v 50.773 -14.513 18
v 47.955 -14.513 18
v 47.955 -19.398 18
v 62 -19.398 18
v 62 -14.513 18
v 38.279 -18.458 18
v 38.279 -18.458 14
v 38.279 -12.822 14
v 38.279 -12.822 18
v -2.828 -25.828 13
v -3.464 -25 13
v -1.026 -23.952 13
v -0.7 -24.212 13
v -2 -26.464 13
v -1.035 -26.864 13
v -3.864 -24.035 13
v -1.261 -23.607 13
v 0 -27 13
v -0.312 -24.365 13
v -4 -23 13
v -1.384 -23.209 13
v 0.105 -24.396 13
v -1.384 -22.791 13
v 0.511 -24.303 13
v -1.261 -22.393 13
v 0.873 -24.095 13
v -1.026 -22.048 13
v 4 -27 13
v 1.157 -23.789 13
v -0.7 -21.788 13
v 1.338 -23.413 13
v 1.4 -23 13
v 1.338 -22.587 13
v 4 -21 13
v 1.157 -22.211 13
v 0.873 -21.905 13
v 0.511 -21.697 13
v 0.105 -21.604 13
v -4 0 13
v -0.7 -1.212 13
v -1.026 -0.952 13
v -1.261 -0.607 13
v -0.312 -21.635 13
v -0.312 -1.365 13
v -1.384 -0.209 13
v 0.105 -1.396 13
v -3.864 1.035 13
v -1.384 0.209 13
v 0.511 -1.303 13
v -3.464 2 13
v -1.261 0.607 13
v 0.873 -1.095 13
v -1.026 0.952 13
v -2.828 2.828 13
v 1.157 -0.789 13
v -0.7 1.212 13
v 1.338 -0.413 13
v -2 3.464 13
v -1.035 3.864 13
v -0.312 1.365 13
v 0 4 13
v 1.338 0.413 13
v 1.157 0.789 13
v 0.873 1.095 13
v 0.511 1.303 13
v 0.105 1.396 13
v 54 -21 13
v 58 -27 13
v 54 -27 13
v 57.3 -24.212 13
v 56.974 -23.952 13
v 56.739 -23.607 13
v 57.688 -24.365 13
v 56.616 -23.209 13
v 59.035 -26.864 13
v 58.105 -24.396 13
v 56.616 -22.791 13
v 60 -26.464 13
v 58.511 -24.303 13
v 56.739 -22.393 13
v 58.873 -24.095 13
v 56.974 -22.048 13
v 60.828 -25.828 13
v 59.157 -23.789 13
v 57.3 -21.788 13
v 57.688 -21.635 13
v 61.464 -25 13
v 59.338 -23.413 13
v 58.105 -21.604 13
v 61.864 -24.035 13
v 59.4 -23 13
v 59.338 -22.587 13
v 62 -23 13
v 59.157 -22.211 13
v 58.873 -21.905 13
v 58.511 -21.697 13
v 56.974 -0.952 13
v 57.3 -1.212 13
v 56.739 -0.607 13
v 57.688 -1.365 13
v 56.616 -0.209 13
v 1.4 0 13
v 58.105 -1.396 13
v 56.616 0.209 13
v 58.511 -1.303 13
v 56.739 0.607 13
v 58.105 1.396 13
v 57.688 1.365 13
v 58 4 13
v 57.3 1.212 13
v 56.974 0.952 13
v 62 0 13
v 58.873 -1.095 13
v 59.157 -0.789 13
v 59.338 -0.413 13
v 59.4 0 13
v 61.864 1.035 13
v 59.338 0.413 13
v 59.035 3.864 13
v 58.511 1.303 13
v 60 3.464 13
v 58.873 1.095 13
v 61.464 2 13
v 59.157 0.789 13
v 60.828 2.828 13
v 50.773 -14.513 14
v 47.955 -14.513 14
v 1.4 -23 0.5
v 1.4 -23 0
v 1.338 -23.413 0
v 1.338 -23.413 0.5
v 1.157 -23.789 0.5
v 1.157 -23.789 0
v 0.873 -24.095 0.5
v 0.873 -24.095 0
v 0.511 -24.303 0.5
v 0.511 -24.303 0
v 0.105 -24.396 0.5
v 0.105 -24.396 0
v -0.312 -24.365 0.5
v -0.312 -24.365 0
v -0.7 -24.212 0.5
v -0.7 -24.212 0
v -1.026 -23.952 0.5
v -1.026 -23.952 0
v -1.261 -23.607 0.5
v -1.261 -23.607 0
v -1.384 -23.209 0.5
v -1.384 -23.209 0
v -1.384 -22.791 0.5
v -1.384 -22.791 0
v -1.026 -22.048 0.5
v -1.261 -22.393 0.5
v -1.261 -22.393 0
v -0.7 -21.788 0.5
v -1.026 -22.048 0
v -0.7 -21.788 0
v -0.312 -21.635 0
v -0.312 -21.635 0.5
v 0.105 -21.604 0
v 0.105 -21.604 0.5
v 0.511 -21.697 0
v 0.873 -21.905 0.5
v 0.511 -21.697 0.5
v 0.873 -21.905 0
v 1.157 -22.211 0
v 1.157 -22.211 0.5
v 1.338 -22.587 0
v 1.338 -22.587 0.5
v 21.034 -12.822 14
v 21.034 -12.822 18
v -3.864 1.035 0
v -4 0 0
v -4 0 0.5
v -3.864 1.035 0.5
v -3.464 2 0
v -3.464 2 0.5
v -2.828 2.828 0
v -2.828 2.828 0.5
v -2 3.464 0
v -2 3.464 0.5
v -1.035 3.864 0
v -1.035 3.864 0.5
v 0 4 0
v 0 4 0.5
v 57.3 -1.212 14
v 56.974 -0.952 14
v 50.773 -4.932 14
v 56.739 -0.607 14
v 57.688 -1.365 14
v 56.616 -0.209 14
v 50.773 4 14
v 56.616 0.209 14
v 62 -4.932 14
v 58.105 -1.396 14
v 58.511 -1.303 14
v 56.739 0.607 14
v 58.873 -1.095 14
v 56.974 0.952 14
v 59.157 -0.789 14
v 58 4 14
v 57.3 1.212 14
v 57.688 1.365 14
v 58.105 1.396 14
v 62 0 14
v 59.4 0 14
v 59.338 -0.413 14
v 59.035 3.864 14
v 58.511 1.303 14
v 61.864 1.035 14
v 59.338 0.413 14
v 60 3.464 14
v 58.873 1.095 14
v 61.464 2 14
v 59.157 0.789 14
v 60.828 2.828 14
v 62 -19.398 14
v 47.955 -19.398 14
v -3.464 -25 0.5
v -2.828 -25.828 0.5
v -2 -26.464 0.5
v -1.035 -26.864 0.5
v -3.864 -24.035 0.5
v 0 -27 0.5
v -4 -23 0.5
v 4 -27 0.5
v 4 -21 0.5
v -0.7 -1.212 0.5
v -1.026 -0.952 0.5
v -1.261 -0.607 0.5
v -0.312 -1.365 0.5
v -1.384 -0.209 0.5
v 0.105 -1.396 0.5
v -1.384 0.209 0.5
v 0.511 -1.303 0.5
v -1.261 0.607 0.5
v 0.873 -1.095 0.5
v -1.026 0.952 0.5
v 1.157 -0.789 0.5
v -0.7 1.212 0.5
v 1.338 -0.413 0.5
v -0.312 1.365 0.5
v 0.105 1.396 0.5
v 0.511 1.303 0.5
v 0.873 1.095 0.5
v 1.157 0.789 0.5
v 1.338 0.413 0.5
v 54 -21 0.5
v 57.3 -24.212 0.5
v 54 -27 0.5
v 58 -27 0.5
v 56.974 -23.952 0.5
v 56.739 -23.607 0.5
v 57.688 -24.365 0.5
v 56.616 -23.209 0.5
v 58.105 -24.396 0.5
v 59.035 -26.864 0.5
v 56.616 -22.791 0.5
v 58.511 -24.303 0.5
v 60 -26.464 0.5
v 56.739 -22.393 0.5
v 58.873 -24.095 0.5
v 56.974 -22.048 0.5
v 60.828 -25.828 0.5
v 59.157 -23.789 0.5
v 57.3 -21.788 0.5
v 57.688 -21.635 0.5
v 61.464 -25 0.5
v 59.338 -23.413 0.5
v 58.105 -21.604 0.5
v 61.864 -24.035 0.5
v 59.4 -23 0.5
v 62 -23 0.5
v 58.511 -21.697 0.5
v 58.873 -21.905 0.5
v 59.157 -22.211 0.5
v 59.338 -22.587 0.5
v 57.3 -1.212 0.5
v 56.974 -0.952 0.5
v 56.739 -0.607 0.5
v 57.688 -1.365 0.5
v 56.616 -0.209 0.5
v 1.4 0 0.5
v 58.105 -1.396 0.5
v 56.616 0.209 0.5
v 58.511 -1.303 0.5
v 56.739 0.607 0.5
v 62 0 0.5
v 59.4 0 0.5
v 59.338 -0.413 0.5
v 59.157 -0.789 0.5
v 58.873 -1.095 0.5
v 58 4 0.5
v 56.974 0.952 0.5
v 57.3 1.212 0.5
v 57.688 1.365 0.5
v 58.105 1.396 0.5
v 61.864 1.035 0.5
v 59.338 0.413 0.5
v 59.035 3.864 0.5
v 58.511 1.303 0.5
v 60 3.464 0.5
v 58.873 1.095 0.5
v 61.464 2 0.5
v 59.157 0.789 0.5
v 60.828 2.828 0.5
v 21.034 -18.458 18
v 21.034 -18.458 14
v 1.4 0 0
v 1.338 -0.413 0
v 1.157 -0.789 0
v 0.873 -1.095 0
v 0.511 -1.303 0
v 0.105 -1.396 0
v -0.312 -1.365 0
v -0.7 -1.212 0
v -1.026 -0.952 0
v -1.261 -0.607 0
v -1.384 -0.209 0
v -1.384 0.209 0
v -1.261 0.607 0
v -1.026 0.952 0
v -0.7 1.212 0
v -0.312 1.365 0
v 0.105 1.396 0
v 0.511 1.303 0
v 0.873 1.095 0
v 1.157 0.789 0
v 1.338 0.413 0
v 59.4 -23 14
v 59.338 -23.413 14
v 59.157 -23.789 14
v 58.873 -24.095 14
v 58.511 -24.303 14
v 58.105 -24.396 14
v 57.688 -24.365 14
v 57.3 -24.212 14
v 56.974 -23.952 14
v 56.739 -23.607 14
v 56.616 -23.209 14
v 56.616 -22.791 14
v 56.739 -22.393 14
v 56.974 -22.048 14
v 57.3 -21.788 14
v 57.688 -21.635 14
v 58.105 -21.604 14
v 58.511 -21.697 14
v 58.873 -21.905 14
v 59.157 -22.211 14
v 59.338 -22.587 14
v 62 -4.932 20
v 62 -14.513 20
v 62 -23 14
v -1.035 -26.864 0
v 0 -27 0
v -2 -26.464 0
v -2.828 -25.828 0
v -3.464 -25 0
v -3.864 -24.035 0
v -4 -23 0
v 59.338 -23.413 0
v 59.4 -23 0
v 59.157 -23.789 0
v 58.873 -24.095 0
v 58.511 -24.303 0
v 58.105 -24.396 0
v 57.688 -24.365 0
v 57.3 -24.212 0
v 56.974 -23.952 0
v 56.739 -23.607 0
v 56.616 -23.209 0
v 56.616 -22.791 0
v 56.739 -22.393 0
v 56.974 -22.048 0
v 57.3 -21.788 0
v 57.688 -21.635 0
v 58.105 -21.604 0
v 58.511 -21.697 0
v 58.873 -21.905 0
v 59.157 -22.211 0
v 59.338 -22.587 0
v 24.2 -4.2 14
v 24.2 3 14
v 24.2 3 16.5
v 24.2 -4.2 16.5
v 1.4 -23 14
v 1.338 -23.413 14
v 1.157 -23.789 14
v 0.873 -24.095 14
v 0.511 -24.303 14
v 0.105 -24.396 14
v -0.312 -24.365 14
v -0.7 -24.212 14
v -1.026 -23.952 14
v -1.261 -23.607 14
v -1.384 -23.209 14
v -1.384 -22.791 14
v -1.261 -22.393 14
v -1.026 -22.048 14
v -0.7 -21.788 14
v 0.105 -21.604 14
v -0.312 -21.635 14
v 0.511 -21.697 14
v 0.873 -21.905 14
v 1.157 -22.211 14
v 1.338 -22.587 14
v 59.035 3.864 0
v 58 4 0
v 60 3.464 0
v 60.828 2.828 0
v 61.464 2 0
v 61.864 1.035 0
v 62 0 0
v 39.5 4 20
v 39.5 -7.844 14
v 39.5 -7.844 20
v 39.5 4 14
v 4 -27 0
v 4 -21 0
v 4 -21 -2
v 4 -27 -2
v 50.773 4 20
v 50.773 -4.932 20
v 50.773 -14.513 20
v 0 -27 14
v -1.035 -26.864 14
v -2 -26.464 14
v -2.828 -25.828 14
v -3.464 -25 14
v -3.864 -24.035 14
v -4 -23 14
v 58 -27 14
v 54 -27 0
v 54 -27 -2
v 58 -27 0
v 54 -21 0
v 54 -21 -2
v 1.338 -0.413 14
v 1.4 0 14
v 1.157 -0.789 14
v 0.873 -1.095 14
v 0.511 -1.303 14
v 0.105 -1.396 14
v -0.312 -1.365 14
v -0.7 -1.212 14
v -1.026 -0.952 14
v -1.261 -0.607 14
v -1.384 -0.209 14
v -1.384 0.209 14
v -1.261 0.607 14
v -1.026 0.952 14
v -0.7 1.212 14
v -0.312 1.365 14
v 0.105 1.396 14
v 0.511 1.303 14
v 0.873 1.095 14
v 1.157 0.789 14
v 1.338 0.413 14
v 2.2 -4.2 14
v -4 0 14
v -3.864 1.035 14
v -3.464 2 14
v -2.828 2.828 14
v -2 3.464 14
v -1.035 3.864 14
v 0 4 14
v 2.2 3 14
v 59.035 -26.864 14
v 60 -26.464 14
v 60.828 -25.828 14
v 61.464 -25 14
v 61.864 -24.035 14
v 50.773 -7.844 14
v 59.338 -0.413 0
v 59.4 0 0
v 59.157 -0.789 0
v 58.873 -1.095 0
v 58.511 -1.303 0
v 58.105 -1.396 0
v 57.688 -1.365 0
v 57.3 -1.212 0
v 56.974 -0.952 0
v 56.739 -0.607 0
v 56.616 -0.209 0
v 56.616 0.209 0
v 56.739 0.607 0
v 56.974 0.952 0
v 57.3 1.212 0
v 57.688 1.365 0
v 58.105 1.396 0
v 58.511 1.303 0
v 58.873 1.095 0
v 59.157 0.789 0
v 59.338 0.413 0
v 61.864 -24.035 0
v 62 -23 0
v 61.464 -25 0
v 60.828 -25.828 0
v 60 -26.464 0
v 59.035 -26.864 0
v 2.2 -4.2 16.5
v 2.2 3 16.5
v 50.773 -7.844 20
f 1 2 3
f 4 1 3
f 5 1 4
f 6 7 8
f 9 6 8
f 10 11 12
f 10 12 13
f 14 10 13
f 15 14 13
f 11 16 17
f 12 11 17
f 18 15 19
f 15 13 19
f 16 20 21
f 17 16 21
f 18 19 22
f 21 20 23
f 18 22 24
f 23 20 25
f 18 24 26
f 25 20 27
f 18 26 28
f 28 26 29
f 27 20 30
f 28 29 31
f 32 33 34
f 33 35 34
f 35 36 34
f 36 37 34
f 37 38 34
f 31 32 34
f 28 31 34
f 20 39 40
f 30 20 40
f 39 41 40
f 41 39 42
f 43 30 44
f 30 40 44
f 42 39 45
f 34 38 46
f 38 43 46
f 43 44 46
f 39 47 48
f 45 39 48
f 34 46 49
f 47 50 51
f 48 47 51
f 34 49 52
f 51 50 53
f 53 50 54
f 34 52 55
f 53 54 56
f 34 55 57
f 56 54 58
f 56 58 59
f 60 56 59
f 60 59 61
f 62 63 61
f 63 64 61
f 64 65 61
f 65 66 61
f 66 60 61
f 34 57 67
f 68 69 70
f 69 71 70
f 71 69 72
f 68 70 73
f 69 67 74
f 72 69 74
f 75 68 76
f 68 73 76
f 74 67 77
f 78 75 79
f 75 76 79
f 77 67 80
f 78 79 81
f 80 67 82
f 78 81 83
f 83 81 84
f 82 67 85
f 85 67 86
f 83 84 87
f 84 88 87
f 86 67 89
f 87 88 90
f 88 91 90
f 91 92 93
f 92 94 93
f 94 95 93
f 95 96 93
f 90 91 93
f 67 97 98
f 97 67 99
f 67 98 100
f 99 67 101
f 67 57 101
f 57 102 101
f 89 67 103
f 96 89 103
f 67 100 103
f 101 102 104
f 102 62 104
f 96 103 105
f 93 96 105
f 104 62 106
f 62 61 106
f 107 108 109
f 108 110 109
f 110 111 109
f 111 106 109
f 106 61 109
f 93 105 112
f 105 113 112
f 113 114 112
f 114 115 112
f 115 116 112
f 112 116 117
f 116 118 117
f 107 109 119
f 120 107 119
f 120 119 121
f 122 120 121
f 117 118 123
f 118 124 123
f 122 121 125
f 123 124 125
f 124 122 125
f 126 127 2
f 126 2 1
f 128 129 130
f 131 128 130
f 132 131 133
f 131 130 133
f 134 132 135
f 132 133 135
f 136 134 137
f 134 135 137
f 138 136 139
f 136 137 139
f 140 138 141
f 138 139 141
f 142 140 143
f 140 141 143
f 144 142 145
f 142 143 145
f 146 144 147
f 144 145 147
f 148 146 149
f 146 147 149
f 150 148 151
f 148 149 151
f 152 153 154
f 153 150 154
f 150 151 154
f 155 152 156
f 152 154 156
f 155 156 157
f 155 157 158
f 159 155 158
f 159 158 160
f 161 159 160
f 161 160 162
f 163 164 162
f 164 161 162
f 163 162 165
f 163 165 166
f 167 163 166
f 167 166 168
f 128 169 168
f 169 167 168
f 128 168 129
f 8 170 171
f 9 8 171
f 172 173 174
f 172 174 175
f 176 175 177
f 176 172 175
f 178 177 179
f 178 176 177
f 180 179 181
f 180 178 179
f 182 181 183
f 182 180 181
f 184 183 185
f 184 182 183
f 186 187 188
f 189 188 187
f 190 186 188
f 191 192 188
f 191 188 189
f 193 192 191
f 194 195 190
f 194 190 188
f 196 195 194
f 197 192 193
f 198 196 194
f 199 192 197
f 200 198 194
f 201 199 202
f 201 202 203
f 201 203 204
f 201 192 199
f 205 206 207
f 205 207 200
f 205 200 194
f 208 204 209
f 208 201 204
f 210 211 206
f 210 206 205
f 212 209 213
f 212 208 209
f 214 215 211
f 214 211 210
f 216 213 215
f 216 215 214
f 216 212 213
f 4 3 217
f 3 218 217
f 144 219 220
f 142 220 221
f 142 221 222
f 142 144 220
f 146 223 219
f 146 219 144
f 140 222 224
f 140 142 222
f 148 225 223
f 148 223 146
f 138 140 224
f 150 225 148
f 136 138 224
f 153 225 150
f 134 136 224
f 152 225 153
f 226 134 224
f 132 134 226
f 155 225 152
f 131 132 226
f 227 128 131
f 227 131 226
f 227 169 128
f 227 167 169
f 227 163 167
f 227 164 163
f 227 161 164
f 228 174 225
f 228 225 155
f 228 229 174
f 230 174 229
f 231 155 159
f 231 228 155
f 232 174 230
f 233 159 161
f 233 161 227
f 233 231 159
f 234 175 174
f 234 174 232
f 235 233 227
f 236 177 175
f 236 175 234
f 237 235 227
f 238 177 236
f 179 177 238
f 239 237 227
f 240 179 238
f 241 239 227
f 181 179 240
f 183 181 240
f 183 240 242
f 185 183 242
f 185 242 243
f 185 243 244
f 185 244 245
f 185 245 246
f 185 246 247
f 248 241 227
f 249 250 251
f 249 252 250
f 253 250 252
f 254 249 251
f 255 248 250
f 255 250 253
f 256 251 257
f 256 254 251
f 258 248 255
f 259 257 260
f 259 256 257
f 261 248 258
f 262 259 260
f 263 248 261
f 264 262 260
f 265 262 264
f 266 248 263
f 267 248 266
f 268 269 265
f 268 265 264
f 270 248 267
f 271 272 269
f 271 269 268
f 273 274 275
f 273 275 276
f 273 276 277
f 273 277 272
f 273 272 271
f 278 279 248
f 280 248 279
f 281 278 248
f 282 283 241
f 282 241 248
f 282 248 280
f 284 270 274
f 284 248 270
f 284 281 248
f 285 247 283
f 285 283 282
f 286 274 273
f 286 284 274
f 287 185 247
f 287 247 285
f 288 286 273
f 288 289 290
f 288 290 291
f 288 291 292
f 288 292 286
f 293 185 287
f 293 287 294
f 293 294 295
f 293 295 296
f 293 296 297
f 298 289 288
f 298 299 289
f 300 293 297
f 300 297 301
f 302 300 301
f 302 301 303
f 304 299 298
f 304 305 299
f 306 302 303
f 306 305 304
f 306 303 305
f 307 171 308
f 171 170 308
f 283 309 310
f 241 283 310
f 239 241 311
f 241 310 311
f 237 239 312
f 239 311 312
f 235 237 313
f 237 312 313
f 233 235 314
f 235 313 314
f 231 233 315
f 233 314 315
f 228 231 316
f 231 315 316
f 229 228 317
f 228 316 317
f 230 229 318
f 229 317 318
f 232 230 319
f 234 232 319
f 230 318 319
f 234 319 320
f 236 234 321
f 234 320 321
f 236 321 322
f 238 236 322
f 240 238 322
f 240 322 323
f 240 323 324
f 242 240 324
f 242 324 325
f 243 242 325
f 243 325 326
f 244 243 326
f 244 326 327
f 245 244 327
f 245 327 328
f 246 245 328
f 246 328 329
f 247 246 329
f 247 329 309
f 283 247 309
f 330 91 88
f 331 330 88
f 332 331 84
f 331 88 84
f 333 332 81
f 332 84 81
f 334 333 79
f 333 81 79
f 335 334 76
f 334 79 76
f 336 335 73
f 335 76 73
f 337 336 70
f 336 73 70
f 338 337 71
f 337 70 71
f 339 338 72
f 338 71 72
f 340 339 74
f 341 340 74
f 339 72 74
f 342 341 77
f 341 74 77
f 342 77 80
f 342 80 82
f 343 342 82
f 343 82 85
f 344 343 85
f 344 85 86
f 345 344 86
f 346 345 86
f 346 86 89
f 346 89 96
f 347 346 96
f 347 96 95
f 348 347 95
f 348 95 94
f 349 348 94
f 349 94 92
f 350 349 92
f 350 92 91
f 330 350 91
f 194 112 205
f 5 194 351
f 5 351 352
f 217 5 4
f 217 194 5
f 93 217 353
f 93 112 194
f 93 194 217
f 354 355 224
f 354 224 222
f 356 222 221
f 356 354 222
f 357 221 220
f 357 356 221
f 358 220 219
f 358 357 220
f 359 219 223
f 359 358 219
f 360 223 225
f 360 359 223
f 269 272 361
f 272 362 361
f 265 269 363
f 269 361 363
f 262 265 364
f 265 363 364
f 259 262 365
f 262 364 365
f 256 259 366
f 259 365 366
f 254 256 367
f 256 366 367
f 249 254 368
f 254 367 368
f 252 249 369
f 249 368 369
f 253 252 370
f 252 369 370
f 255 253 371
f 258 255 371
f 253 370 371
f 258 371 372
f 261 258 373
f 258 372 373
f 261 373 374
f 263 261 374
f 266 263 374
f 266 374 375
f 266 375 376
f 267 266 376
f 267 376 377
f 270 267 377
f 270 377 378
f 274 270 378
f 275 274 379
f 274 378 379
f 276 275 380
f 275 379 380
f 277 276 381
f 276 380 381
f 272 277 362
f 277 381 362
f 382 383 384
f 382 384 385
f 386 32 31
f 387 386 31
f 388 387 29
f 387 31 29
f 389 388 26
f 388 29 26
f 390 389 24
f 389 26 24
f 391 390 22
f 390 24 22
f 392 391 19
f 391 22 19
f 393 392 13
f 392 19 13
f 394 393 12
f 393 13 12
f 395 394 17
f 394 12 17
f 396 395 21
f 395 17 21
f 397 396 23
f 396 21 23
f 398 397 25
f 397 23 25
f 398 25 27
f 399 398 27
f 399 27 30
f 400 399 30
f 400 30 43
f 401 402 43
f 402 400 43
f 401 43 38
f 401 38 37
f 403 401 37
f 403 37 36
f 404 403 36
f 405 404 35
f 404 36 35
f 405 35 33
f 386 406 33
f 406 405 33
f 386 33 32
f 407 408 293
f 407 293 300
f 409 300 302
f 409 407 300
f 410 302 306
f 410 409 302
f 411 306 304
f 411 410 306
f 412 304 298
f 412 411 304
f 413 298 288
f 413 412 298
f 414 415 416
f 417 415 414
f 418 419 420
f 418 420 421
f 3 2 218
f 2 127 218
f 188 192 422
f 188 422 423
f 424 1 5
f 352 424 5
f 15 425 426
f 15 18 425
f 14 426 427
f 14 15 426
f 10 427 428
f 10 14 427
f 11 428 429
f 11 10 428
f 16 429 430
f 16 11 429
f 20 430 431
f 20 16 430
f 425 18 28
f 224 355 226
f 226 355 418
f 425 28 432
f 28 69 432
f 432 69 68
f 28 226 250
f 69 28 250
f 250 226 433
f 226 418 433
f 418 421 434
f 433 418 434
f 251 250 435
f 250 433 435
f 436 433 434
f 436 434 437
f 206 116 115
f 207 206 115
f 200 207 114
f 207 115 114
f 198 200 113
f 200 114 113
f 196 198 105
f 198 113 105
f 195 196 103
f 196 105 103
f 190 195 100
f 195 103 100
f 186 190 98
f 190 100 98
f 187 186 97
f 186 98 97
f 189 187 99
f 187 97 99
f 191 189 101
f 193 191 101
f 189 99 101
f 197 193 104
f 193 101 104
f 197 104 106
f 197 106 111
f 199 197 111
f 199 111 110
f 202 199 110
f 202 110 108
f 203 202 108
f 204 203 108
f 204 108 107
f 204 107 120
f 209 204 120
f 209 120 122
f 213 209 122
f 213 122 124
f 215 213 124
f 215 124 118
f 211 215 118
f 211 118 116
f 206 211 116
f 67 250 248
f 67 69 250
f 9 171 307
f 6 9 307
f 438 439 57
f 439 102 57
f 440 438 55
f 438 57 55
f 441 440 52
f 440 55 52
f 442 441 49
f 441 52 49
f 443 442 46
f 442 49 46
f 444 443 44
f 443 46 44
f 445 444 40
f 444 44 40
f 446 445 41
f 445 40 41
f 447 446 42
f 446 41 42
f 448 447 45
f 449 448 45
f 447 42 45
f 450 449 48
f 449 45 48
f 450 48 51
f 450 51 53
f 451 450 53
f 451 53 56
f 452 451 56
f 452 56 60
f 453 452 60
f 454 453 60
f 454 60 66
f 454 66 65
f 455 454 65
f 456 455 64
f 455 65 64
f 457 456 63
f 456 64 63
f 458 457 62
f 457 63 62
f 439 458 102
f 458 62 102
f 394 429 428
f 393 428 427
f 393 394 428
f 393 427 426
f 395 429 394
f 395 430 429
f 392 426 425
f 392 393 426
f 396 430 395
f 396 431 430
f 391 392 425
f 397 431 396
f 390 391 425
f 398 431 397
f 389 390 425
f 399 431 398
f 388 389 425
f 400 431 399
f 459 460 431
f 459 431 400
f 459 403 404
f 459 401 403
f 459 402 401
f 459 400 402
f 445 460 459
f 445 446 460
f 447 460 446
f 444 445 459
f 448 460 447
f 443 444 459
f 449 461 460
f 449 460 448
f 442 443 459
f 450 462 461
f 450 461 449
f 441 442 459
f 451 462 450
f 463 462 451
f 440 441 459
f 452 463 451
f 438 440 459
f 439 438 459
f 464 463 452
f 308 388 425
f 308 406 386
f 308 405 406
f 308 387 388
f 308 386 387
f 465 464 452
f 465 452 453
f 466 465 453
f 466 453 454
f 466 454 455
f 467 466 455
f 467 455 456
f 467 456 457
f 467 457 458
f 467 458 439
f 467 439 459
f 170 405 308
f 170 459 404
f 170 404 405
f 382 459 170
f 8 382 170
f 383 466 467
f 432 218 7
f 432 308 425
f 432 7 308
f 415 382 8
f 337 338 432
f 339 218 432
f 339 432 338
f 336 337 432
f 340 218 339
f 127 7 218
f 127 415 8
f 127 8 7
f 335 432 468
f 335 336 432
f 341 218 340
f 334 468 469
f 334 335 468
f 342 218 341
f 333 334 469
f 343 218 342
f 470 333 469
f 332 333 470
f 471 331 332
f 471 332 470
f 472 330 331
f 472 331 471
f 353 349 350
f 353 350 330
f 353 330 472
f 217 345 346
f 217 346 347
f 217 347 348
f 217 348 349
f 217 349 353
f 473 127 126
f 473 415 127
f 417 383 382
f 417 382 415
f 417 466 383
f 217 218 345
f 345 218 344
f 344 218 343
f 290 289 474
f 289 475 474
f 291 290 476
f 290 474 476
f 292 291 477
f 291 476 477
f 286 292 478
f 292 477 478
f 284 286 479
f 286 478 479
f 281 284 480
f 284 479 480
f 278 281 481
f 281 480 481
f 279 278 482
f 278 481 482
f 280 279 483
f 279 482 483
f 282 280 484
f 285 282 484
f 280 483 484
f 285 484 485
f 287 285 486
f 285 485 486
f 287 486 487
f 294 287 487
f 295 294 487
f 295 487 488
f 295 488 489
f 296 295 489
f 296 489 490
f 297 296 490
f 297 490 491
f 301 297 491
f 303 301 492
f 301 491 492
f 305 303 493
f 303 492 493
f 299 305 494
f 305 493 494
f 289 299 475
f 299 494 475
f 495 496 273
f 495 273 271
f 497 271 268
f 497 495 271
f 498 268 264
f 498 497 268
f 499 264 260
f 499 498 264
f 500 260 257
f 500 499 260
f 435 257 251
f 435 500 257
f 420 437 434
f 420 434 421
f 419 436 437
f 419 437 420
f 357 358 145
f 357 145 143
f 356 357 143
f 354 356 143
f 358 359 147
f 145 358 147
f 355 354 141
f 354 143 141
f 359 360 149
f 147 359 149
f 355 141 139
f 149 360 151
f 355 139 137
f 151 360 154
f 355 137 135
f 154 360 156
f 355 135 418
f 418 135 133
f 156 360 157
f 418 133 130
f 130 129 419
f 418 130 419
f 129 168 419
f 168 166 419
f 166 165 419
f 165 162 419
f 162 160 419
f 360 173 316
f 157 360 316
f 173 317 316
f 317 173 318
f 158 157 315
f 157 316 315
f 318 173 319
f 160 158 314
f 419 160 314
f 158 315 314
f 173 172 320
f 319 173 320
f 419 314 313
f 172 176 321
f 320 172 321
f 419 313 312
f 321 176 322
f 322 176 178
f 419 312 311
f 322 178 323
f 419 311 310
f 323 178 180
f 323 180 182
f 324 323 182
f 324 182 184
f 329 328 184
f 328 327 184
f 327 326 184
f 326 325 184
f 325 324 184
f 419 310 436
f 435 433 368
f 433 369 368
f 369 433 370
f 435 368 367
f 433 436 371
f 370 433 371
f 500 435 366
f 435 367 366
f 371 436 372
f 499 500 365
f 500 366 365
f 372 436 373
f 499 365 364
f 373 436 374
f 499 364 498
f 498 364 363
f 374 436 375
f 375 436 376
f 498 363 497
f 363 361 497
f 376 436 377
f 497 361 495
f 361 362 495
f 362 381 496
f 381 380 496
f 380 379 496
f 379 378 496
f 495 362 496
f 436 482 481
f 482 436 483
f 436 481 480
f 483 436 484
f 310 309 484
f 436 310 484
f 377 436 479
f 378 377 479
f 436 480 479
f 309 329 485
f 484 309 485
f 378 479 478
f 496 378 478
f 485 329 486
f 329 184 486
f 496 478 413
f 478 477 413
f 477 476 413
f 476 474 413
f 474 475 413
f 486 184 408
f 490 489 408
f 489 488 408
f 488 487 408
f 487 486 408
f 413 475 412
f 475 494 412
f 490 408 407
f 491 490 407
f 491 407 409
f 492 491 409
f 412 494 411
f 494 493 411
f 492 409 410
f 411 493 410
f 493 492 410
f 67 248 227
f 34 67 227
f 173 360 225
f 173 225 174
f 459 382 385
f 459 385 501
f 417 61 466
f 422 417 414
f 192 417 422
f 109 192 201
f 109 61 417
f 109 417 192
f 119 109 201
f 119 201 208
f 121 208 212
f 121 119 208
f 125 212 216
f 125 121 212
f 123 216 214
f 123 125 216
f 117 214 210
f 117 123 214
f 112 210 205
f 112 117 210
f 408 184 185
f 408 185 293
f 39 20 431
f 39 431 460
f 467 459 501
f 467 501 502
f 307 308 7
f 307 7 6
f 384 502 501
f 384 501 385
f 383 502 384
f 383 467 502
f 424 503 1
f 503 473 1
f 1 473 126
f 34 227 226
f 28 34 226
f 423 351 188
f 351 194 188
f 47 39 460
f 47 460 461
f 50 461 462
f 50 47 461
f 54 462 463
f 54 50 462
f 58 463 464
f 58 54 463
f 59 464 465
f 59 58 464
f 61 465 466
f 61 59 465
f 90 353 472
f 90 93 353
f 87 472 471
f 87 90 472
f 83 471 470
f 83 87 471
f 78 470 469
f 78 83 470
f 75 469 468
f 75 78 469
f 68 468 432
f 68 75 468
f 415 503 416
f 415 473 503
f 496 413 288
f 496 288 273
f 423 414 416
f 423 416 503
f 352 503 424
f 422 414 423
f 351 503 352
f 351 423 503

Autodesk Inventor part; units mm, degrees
ref_plane "YZ Plane" through (0, 0, 0) normal (1, 0, 0) x (0, 1, 0)
ref_plane "XZ Plane" through (0, 0, 0) normal (0, 1, 0) x (-1, 0, 0)
ref_plane "XY Plane" through (0, 0, 0) normal (0, 0, 1) x (1, 0, 0)
sketch "스케치1" plane through (0, 0, 0) normal (0, 0, 1) x (1, 0, 0)
  circle A0 centre (0, 0) radius 1.4
  line L0 (0, 0) -> (58, 0)
  line L1 (58, 0) -> (58, -23)
  circle A1 centre (58, 0) radius 1.4
  circle A2 centre (0, -23) radius 1.4
  circle A3 centre (58, -23) radius 1.4
  line L2 (0, 0) -> (0, 4)
  line L3 (0, 4) -> (-4, 4)
  line L4 (0, 4) -> (58, 4)
  line L5 (62, 0) -> (62, -23)
  line L6 (58, -27) -> (0, -27)
  line L7 (-4, -23) -> (-4, 0)
  arc A4 (0, 4) -> (-4, 0) centre (0, 0) ccw
  arc A5 (62, 0) -> (58, 4) centre (58, 0) ccw
  arc A6 (58, -27) -> (62, -23) centre (58, -23) ccw
  arc A7 (-4, -23) -> (0, -27) centre (0, -23) ccw
  point P0 (62, -27)
  point P1 (62, 4)
  point P2 (-4, -27)
  dimension "d0" = 2.8
  dimension "d1" = 58
  dimension "d2" = 23
  dimension "d5" = 58
  dimension "d8" = 23
  dimension "d11" = 4
  dimension "d12" = 4
  dimension "d13" = 66
  dimension "d14" = 31
  dimension "d21" = 4
extrude "돌출1" add sketch "스케치1" along normal blind 14
extrude "돌출2" cut sketch "스케치1" along normal blind 13
extrude "돌출3" add sketch "스케치1" along normal blind 1.5
sketch "스케치2" plane through (0, 0, 14) normal (0, 0, 1) x (1, 0, 0)
  line L0 (58, 4) -> (0, 4) projected
  line L1 (39.5003, 4) -> (50.7727, 4)
  line L2 (50.7727, 4) -> (50.7727, -7.8437)
  line L3 (50.7727, -7.8437) -> (39.5003, -7.8437)
  line L4 (39.5003, -7.8437) -> (39.5003, 4)
  line L5 (62, -23) -> (62, 0) projected
  line L6 (62, -4.9317) -> (50.7727, -4.9317)
  line L7 (50.7727, -4.9317) -> (50.7727, -14.5132)
  line L8 (50.7727, -14.5132) -> (62, -14.5132)
  line L9 (62, -14.5132) -> (62, -4.9317)
  line L10 (62, -14.5132) -> (47.9546, -14.5132)
  line L11 (47.9546, -14.5132) -> (47.9546, -19.3979)
  line L12 (47.9546, -19.3979) -> (62, -19.3979)
  line L13 (62, -19.3979) -> (62, -14.5132)
  line L14 (38.2792, -12.8223) -> (25.0341, -12.8223)
  line L15 (25.0341, -12.8223) -> (25.0341, -18.4585)
  line L16 (25.0341, -18.4585) -> (38.2792, -18.4585)
  line L17 (38.2792, -18.4585) -> (38.2792, -12.8223)
  point P0 (0, 0)
  point P1 (50.7727, -7.8437)
extrude "돌출4" add sketch "스케치2" along normal blind 6 contours L2 L3 L4 L0 | L6 L5 L8 L7 L2
extrude "돌출5" add sketch "스케치2" along normal blind 4 contours L8 L5 L12 L11 L10 | L17 L16 L15 L14
sketch "스케치3" plane through (0, 0, 1.5) normal (0, 0, 1) x (1, 0, 0)
  line L0 (0, -27) -> (58, -27) projected
  line L1 (29, -27) -> (4, -27)
  line L2 (4, -27) -> (54, -27)
  line L3 (54, -27) -> (54, -21)
  line L4 (54, -21) -> (4, -21)
  line L5 (4, -21) -> (4, -27)
  point P0 (0, 0)
  dimension "d26" = 25
  dimension "d27" = 50
  dimension "d28" = 6
extrude "돌출6" add sketch "스케치3" along normal blind 12.25
extrude "돌출7" add sketch "스케치1" along normal blind 9.5
sketch "스케치4" plane through (0, 0, 0) normal (0, 0, -1) x (-1, 0, 0)
  line L0 (-4, -21) -> (-4, -27) projected
  line L1 (-4, -21) -> (-4, -27) projected
  line L2 (-54, -27) -> (-54, -21) projected
  line L3 (-54, -27) -> (-54, -21) projected
  line L4 (-54, -21) -> (-4, -21) projected
  line L5 (-54, -21) -> (-4, -21)
  line L6 (-4, -21) -> (-4, -27)
  line L7 (-4, -27) -> (-54, -27)
  line L8 (-54, -27) -> (-54, -21)
  point P0 (0, 0)
extrude "돌출8" add sketch "스케치4" along normal blind 2
sketch "스케치5" plane through (0, 0, 14) normal (0, 0, 1) x (1, 0, 0)
  circle A0 centre (0, 0) radius 2.2
  line L0 (2.2, 0) -> (2.2, 3)
  line L1 (58, 4) -> (0, 4) projected
  line L2 (2.2, 3) -> (24.2, 3)
  line L3 (24.2, 3) -> (24.2, -4.2)
  line L4 (24.2, -4.2) -> (2.2, -4.2)
  line L5 (2.2, -4.2) -> (2.2, 3)
  dimension "d35" = 4.4
  dimension "d36" = 3
  dimension "d37" = 22
  dimension "d38" = 7.2
extrude "돌출9" add sketch "스케치5" along normal blind 2.5 contours L0 L2 L3 L4 L5
move faces "이동1" translate (-4, 0, 0) faces at (25.0341, -14.7011, 15.3333)
move faces "이동2" translate (0, 0, -9) faces at (37.3333, -7.2234, 9.5)
properties part number "라파+hat"
